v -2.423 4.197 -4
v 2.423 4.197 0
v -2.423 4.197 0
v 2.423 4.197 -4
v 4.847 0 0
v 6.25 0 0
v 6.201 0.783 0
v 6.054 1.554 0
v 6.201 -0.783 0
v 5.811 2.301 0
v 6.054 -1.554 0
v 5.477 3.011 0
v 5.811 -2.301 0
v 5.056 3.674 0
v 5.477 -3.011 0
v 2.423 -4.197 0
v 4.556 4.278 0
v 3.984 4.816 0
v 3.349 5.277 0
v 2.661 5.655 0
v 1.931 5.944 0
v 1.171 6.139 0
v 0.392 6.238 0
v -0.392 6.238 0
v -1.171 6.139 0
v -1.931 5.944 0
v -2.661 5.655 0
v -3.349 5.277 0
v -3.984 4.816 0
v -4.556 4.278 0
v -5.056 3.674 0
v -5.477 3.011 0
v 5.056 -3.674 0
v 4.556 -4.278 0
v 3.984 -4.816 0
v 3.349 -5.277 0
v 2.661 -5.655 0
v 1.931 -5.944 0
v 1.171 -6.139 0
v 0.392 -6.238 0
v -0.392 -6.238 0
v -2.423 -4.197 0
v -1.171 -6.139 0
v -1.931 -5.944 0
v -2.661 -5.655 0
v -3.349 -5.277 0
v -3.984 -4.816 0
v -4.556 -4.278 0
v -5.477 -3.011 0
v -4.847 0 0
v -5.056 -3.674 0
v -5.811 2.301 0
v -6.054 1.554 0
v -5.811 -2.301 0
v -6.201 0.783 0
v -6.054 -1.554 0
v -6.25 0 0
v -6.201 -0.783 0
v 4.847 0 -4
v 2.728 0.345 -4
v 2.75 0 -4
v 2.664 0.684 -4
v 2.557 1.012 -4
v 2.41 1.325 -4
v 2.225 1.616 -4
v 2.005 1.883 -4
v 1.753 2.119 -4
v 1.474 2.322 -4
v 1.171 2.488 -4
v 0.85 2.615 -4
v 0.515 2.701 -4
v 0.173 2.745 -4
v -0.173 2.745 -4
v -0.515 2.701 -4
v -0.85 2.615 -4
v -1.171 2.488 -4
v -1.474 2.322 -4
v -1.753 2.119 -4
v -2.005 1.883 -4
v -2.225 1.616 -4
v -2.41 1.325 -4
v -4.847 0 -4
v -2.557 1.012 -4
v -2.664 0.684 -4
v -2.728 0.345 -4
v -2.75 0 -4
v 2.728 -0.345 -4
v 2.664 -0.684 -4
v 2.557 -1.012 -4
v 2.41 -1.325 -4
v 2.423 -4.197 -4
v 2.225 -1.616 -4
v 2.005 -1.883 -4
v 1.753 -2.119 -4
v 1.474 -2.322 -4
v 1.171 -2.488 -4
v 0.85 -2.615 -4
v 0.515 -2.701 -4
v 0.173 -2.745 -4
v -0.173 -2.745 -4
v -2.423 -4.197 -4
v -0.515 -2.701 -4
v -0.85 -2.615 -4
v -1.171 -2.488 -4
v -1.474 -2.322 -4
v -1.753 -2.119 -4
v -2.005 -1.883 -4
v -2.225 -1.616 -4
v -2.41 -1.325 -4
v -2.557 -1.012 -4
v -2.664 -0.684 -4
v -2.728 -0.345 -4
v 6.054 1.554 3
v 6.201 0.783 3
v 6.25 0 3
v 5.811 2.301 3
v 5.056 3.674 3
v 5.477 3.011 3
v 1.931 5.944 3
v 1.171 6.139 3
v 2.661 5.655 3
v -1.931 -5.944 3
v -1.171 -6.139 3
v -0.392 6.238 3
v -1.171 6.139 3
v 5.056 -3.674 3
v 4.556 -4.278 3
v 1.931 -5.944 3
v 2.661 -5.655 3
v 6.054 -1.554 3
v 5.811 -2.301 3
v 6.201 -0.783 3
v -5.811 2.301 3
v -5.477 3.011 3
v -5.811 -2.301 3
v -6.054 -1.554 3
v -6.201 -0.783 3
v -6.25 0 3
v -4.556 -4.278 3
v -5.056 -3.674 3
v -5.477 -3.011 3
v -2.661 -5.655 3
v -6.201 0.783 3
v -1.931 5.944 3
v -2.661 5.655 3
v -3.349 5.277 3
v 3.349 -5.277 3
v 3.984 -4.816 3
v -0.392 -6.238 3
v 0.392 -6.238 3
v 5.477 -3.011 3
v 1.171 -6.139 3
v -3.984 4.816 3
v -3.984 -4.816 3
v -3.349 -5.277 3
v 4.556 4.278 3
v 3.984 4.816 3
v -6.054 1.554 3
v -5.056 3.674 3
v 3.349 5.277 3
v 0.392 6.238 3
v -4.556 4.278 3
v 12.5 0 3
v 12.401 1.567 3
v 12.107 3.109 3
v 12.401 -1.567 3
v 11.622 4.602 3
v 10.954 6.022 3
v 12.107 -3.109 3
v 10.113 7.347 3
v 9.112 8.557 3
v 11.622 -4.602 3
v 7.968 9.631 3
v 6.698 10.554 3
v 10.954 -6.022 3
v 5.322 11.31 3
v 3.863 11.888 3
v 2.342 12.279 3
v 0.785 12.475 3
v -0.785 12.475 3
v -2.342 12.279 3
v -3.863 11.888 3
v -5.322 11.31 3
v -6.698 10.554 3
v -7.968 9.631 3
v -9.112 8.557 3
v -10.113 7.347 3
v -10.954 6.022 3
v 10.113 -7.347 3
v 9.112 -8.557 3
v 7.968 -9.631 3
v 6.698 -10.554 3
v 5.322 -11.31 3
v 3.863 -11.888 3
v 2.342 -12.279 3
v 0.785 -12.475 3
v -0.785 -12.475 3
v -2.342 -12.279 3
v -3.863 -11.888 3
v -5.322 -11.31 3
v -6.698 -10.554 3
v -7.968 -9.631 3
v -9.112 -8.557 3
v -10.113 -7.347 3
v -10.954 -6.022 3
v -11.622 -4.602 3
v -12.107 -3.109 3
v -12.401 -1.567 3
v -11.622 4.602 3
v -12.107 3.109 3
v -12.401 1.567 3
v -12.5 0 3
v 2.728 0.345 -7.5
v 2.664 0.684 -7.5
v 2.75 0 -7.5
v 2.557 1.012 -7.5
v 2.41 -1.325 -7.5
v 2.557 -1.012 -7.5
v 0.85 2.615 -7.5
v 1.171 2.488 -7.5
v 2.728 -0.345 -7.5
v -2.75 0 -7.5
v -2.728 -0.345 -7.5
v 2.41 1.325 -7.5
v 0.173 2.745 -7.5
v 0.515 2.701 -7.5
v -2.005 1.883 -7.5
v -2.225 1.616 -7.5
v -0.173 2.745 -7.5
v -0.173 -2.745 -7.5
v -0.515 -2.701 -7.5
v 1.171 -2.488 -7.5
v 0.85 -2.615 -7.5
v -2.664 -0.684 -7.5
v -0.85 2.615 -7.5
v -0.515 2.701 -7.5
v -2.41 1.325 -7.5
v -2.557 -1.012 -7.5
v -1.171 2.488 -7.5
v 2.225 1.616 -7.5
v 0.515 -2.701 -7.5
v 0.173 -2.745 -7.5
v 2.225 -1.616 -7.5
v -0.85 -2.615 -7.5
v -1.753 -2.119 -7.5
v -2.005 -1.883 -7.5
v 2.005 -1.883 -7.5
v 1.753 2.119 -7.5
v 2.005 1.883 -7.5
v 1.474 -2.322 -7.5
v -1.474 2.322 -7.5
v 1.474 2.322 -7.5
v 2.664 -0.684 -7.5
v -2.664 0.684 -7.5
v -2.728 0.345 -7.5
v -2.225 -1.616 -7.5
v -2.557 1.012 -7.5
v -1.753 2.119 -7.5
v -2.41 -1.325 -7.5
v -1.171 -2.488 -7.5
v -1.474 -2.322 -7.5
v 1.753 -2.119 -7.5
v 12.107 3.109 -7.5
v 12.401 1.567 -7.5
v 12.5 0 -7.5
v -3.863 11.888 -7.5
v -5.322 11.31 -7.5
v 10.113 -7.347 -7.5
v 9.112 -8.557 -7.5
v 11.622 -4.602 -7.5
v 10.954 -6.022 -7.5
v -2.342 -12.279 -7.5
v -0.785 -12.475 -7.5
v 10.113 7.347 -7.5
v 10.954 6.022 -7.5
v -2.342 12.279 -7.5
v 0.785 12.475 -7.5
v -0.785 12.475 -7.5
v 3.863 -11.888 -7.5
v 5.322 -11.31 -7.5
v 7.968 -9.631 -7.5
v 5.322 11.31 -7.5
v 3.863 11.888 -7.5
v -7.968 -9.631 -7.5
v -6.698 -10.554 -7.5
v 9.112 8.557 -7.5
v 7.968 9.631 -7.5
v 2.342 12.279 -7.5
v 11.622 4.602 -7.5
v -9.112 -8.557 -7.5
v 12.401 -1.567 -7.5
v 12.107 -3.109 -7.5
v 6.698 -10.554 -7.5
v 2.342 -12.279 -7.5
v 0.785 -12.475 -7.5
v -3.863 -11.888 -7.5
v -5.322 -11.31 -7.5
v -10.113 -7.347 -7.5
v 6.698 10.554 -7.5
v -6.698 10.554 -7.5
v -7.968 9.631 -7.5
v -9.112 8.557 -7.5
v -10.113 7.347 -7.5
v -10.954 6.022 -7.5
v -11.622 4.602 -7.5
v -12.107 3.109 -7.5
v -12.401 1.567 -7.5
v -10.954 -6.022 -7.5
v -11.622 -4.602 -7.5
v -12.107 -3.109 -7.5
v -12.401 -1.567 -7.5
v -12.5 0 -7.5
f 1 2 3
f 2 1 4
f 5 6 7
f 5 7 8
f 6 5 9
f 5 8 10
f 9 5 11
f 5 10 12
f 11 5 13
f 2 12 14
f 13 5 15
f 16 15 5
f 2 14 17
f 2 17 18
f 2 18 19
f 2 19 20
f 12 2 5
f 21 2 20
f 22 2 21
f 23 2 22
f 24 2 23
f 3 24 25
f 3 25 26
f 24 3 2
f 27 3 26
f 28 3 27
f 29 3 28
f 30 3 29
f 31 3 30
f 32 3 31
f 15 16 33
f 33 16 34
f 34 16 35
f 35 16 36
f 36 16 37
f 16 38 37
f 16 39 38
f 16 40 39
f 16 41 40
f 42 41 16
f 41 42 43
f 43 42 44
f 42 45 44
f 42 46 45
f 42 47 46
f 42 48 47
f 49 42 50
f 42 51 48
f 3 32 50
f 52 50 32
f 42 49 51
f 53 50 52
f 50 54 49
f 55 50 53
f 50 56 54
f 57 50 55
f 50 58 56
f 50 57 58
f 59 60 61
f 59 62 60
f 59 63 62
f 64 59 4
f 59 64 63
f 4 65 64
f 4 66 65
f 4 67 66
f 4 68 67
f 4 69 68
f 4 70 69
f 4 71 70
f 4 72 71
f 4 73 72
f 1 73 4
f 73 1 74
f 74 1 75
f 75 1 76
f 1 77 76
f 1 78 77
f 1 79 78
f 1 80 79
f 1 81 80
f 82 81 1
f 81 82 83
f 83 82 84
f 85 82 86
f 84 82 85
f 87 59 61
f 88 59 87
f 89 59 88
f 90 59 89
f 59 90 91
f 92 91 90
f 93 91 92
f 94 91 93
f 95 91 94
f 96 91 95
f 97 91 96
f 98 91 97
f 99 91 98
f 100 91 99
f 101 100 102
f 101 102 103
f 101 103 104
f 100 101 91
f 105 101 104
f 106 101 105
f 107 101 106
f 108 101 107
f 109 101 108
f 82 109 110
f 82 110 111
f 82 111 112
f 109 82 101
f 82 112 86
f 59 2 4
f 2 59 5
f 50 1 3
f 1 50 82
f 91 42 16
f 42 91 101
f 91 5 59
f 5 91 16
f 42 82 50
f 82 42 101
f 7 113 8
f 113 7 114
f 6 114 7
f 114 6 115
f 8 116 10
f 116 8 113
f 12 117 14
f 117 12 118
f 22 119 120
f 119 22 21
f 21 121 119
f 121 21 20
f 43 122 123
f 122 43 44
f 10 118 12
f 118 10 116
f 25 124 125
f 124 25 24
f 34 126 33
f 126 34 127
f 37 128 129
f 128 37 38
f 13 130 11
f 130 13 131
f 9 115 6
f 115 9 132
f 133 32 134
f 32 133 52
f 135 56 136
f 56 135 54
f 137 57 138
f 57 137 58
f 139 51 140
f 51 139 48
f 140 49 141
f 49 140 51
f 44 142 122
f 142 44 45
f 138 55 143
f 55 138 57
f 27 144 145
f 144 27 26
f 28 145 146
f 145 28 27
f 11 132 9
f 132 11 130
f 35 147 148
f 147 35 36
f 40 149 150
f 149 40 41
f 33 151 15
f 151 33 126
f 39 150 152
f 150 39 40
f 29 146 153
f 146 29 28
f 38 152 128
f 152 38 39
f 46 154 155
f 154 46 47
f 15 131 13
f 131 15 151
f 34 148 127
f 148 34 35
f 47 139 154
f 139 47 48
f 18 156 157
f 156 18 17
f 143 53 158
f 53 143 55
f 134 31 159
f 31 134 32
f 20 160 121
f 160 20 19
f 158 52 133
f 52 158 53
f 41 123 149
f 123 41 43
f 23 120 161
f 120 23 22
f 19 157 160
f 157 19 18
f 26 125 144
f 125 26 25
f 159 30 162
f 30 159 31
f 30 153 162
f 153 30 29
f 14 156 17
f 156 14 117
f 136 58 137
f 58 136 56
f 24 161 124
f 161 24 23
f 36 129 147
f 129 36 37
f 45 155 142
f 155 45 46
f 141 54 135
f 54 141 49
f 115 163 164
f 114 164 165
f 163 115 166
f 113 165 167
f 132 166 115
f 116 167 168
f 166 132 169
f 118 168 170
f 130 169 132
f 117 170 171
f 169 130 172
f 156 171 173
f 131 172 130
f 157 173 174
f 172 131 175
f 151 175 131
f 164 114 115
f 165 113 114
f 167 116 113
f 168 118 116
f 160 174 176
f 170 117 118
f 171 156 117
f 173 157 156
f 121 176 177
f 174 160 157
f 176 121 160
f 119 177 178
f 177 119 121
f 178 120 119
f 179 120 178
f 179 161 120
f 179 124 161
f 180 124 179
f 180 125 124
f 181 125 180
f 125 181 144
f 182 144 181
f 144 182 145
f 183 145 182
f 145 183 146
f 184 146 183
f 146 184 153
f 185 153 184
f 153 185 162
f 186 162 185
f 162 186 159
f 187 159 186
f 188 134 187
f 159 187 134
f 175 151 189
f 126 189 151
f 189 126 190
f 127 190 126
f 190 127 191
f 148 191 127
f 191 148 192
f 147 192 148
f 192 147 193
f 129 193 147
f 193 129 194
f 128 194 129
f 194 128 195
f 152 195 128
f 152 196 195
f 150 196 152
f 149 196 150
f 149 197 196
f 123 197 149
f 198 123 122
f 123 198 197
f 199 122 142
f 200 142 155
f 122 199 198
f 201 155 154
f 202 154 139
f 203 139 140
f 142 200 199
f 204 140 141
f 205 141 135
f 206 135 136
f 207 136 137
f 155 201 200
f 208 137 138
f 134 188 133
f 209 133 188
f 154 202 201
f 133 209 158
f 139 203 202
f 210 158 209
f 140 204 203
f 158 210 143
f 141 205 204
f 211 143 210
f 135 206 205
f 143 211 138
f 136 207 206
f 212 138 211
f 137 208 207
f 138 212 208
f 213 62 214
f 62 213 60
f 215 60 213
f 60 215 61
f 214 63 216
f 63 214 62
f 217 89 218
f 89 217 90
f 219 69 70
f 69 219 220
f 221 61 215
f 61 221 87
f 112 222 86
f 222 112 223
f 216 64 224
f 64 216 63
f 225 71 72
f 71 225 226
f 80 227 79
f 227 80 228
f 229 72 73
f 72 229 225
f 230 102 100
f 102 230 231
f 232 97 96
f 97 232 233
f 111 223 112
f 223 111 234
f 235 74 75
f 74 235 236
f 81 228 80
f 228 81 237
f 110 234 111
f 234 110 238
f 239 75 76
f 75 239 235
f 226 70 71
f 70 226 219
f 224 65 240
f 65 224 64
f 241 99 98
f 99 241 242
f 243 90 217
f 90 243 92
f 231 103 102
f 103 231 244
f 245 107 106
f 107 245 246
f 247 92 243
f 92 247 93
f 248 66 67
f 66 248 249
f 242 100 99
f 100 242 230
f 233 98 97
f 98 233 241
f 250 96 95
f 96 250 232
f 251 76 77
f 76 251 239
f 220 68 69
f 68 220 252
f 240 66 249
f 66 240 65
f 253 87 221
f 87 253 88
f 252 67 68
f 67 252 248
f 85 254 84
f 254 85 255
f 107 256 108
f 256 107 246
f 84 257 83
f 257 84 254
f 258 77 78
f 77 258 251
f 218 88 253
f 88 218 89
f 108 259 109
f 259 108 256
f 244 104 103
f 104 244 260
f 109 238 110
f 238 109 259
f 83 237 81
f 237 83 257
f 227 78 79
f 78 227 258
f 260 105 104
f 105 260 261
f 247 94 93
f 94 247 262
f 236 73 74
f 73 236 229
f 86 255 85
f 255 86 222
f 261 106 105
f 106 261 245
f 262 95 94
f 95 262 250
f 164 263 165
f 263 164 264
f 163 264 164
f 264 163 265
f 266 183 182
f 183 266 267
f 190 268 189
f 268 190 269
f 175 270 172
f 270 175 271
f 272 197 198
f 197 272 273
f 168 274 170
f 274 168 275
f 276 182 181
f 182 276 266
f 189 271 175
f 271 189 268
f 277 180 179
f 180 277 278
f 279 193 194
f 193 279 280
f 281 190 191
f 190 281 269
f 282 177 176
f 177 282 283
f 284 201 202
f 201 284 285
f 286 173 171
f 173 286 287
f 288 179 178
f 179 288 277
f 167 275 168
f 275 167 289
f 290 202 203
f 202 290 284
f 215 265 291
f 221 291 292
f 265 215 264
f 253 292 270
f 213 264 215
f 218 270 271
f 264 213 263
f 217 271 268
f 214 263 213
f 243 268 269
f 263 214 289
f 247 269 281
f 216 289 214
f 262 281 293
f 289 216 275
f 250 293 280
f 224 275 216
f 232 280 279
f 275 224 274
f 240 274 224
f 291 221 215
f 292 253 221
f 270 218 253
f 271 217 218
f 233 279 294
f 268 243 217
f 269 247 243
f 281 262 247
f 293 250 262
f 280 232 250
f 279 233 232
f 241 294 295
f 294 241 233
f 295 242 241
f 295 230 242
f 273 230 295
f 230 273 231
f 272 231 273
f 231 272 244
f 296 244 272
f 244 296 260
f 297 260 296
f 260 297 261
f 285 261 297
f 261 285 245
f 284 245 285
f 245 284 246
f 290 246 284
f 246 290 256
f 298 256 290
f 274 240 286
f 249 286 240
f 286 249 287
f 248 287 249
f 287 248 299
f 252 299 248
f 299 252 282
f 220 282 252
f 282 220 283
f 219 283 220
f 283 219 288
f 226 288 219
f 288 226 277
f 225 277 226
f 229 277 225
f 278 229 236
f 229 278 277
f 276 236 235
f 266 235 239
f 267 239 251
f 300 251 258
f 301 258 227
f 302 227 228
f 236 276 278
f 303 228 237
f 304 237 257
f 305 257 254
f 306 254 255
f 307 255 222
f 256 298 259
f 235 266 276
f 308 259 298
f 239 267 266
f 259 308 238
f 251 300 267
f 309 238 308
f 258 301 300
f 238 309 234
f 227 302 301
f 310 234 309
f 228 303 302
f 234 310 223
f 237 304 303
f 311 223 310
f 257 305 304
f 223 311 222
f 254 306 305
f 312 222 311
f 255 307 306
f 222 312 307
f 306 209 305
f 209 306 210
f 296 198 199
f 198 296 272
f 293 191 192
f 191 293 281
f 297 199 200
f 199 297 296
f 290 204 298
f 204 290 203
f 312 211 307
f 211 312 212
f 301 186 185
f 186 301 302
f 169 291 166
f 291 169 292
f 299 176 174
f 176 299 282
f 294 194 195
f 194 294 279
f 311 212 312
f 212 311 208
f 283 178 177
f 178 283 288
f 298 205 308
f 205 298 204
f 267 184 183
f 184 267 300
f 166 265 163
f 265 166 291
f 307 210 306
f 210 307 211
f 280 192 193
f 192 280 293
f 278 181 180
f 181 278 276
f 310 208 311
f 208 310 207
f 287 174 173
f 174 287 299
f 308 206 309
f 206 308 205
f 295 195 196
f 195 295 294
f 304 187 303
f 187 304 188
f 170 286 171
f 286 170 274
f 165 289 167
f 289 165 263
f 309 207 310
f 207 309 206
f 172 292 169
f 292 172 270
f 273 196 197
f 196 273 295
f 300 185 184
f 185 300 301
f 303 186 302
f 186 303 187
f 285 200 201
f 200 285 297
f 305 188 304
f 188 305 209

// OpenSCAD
$fn = 50;


difference() {
	union() {
		translate(v = [0, 0, -7.5000000000]) {
			cylinder(h = 10.5000000000, r = 12.5000000000);
		}
	}
	union() {
		translate(v = [0, 0, 0]) {
			rotate(a = [0, 0, 0]) {
				difference() {
					union() {
						translate(v = [0, 0, -4]) {
							linear_extrude(height = 4) {
								polygon(points = [[4.8468000000, 0.0000000000], [2.4234000000, 4.1974519271], [-2.4234000000, 4.1974519271], [-4.8468000000, 0.0000000000], [-2.4234000000, -4.1974519271], [2.4234000000, -4.1974519271]]);
							}
						}
					}
					union();
				}
			}
		}
		#cylinder(h = 3, r = 6.2500000000);
		#translate(v = [0, 0, -100.0000000000]) {
			cylinder(h = 200, r = 2.7500000000);
		}
	}
}
